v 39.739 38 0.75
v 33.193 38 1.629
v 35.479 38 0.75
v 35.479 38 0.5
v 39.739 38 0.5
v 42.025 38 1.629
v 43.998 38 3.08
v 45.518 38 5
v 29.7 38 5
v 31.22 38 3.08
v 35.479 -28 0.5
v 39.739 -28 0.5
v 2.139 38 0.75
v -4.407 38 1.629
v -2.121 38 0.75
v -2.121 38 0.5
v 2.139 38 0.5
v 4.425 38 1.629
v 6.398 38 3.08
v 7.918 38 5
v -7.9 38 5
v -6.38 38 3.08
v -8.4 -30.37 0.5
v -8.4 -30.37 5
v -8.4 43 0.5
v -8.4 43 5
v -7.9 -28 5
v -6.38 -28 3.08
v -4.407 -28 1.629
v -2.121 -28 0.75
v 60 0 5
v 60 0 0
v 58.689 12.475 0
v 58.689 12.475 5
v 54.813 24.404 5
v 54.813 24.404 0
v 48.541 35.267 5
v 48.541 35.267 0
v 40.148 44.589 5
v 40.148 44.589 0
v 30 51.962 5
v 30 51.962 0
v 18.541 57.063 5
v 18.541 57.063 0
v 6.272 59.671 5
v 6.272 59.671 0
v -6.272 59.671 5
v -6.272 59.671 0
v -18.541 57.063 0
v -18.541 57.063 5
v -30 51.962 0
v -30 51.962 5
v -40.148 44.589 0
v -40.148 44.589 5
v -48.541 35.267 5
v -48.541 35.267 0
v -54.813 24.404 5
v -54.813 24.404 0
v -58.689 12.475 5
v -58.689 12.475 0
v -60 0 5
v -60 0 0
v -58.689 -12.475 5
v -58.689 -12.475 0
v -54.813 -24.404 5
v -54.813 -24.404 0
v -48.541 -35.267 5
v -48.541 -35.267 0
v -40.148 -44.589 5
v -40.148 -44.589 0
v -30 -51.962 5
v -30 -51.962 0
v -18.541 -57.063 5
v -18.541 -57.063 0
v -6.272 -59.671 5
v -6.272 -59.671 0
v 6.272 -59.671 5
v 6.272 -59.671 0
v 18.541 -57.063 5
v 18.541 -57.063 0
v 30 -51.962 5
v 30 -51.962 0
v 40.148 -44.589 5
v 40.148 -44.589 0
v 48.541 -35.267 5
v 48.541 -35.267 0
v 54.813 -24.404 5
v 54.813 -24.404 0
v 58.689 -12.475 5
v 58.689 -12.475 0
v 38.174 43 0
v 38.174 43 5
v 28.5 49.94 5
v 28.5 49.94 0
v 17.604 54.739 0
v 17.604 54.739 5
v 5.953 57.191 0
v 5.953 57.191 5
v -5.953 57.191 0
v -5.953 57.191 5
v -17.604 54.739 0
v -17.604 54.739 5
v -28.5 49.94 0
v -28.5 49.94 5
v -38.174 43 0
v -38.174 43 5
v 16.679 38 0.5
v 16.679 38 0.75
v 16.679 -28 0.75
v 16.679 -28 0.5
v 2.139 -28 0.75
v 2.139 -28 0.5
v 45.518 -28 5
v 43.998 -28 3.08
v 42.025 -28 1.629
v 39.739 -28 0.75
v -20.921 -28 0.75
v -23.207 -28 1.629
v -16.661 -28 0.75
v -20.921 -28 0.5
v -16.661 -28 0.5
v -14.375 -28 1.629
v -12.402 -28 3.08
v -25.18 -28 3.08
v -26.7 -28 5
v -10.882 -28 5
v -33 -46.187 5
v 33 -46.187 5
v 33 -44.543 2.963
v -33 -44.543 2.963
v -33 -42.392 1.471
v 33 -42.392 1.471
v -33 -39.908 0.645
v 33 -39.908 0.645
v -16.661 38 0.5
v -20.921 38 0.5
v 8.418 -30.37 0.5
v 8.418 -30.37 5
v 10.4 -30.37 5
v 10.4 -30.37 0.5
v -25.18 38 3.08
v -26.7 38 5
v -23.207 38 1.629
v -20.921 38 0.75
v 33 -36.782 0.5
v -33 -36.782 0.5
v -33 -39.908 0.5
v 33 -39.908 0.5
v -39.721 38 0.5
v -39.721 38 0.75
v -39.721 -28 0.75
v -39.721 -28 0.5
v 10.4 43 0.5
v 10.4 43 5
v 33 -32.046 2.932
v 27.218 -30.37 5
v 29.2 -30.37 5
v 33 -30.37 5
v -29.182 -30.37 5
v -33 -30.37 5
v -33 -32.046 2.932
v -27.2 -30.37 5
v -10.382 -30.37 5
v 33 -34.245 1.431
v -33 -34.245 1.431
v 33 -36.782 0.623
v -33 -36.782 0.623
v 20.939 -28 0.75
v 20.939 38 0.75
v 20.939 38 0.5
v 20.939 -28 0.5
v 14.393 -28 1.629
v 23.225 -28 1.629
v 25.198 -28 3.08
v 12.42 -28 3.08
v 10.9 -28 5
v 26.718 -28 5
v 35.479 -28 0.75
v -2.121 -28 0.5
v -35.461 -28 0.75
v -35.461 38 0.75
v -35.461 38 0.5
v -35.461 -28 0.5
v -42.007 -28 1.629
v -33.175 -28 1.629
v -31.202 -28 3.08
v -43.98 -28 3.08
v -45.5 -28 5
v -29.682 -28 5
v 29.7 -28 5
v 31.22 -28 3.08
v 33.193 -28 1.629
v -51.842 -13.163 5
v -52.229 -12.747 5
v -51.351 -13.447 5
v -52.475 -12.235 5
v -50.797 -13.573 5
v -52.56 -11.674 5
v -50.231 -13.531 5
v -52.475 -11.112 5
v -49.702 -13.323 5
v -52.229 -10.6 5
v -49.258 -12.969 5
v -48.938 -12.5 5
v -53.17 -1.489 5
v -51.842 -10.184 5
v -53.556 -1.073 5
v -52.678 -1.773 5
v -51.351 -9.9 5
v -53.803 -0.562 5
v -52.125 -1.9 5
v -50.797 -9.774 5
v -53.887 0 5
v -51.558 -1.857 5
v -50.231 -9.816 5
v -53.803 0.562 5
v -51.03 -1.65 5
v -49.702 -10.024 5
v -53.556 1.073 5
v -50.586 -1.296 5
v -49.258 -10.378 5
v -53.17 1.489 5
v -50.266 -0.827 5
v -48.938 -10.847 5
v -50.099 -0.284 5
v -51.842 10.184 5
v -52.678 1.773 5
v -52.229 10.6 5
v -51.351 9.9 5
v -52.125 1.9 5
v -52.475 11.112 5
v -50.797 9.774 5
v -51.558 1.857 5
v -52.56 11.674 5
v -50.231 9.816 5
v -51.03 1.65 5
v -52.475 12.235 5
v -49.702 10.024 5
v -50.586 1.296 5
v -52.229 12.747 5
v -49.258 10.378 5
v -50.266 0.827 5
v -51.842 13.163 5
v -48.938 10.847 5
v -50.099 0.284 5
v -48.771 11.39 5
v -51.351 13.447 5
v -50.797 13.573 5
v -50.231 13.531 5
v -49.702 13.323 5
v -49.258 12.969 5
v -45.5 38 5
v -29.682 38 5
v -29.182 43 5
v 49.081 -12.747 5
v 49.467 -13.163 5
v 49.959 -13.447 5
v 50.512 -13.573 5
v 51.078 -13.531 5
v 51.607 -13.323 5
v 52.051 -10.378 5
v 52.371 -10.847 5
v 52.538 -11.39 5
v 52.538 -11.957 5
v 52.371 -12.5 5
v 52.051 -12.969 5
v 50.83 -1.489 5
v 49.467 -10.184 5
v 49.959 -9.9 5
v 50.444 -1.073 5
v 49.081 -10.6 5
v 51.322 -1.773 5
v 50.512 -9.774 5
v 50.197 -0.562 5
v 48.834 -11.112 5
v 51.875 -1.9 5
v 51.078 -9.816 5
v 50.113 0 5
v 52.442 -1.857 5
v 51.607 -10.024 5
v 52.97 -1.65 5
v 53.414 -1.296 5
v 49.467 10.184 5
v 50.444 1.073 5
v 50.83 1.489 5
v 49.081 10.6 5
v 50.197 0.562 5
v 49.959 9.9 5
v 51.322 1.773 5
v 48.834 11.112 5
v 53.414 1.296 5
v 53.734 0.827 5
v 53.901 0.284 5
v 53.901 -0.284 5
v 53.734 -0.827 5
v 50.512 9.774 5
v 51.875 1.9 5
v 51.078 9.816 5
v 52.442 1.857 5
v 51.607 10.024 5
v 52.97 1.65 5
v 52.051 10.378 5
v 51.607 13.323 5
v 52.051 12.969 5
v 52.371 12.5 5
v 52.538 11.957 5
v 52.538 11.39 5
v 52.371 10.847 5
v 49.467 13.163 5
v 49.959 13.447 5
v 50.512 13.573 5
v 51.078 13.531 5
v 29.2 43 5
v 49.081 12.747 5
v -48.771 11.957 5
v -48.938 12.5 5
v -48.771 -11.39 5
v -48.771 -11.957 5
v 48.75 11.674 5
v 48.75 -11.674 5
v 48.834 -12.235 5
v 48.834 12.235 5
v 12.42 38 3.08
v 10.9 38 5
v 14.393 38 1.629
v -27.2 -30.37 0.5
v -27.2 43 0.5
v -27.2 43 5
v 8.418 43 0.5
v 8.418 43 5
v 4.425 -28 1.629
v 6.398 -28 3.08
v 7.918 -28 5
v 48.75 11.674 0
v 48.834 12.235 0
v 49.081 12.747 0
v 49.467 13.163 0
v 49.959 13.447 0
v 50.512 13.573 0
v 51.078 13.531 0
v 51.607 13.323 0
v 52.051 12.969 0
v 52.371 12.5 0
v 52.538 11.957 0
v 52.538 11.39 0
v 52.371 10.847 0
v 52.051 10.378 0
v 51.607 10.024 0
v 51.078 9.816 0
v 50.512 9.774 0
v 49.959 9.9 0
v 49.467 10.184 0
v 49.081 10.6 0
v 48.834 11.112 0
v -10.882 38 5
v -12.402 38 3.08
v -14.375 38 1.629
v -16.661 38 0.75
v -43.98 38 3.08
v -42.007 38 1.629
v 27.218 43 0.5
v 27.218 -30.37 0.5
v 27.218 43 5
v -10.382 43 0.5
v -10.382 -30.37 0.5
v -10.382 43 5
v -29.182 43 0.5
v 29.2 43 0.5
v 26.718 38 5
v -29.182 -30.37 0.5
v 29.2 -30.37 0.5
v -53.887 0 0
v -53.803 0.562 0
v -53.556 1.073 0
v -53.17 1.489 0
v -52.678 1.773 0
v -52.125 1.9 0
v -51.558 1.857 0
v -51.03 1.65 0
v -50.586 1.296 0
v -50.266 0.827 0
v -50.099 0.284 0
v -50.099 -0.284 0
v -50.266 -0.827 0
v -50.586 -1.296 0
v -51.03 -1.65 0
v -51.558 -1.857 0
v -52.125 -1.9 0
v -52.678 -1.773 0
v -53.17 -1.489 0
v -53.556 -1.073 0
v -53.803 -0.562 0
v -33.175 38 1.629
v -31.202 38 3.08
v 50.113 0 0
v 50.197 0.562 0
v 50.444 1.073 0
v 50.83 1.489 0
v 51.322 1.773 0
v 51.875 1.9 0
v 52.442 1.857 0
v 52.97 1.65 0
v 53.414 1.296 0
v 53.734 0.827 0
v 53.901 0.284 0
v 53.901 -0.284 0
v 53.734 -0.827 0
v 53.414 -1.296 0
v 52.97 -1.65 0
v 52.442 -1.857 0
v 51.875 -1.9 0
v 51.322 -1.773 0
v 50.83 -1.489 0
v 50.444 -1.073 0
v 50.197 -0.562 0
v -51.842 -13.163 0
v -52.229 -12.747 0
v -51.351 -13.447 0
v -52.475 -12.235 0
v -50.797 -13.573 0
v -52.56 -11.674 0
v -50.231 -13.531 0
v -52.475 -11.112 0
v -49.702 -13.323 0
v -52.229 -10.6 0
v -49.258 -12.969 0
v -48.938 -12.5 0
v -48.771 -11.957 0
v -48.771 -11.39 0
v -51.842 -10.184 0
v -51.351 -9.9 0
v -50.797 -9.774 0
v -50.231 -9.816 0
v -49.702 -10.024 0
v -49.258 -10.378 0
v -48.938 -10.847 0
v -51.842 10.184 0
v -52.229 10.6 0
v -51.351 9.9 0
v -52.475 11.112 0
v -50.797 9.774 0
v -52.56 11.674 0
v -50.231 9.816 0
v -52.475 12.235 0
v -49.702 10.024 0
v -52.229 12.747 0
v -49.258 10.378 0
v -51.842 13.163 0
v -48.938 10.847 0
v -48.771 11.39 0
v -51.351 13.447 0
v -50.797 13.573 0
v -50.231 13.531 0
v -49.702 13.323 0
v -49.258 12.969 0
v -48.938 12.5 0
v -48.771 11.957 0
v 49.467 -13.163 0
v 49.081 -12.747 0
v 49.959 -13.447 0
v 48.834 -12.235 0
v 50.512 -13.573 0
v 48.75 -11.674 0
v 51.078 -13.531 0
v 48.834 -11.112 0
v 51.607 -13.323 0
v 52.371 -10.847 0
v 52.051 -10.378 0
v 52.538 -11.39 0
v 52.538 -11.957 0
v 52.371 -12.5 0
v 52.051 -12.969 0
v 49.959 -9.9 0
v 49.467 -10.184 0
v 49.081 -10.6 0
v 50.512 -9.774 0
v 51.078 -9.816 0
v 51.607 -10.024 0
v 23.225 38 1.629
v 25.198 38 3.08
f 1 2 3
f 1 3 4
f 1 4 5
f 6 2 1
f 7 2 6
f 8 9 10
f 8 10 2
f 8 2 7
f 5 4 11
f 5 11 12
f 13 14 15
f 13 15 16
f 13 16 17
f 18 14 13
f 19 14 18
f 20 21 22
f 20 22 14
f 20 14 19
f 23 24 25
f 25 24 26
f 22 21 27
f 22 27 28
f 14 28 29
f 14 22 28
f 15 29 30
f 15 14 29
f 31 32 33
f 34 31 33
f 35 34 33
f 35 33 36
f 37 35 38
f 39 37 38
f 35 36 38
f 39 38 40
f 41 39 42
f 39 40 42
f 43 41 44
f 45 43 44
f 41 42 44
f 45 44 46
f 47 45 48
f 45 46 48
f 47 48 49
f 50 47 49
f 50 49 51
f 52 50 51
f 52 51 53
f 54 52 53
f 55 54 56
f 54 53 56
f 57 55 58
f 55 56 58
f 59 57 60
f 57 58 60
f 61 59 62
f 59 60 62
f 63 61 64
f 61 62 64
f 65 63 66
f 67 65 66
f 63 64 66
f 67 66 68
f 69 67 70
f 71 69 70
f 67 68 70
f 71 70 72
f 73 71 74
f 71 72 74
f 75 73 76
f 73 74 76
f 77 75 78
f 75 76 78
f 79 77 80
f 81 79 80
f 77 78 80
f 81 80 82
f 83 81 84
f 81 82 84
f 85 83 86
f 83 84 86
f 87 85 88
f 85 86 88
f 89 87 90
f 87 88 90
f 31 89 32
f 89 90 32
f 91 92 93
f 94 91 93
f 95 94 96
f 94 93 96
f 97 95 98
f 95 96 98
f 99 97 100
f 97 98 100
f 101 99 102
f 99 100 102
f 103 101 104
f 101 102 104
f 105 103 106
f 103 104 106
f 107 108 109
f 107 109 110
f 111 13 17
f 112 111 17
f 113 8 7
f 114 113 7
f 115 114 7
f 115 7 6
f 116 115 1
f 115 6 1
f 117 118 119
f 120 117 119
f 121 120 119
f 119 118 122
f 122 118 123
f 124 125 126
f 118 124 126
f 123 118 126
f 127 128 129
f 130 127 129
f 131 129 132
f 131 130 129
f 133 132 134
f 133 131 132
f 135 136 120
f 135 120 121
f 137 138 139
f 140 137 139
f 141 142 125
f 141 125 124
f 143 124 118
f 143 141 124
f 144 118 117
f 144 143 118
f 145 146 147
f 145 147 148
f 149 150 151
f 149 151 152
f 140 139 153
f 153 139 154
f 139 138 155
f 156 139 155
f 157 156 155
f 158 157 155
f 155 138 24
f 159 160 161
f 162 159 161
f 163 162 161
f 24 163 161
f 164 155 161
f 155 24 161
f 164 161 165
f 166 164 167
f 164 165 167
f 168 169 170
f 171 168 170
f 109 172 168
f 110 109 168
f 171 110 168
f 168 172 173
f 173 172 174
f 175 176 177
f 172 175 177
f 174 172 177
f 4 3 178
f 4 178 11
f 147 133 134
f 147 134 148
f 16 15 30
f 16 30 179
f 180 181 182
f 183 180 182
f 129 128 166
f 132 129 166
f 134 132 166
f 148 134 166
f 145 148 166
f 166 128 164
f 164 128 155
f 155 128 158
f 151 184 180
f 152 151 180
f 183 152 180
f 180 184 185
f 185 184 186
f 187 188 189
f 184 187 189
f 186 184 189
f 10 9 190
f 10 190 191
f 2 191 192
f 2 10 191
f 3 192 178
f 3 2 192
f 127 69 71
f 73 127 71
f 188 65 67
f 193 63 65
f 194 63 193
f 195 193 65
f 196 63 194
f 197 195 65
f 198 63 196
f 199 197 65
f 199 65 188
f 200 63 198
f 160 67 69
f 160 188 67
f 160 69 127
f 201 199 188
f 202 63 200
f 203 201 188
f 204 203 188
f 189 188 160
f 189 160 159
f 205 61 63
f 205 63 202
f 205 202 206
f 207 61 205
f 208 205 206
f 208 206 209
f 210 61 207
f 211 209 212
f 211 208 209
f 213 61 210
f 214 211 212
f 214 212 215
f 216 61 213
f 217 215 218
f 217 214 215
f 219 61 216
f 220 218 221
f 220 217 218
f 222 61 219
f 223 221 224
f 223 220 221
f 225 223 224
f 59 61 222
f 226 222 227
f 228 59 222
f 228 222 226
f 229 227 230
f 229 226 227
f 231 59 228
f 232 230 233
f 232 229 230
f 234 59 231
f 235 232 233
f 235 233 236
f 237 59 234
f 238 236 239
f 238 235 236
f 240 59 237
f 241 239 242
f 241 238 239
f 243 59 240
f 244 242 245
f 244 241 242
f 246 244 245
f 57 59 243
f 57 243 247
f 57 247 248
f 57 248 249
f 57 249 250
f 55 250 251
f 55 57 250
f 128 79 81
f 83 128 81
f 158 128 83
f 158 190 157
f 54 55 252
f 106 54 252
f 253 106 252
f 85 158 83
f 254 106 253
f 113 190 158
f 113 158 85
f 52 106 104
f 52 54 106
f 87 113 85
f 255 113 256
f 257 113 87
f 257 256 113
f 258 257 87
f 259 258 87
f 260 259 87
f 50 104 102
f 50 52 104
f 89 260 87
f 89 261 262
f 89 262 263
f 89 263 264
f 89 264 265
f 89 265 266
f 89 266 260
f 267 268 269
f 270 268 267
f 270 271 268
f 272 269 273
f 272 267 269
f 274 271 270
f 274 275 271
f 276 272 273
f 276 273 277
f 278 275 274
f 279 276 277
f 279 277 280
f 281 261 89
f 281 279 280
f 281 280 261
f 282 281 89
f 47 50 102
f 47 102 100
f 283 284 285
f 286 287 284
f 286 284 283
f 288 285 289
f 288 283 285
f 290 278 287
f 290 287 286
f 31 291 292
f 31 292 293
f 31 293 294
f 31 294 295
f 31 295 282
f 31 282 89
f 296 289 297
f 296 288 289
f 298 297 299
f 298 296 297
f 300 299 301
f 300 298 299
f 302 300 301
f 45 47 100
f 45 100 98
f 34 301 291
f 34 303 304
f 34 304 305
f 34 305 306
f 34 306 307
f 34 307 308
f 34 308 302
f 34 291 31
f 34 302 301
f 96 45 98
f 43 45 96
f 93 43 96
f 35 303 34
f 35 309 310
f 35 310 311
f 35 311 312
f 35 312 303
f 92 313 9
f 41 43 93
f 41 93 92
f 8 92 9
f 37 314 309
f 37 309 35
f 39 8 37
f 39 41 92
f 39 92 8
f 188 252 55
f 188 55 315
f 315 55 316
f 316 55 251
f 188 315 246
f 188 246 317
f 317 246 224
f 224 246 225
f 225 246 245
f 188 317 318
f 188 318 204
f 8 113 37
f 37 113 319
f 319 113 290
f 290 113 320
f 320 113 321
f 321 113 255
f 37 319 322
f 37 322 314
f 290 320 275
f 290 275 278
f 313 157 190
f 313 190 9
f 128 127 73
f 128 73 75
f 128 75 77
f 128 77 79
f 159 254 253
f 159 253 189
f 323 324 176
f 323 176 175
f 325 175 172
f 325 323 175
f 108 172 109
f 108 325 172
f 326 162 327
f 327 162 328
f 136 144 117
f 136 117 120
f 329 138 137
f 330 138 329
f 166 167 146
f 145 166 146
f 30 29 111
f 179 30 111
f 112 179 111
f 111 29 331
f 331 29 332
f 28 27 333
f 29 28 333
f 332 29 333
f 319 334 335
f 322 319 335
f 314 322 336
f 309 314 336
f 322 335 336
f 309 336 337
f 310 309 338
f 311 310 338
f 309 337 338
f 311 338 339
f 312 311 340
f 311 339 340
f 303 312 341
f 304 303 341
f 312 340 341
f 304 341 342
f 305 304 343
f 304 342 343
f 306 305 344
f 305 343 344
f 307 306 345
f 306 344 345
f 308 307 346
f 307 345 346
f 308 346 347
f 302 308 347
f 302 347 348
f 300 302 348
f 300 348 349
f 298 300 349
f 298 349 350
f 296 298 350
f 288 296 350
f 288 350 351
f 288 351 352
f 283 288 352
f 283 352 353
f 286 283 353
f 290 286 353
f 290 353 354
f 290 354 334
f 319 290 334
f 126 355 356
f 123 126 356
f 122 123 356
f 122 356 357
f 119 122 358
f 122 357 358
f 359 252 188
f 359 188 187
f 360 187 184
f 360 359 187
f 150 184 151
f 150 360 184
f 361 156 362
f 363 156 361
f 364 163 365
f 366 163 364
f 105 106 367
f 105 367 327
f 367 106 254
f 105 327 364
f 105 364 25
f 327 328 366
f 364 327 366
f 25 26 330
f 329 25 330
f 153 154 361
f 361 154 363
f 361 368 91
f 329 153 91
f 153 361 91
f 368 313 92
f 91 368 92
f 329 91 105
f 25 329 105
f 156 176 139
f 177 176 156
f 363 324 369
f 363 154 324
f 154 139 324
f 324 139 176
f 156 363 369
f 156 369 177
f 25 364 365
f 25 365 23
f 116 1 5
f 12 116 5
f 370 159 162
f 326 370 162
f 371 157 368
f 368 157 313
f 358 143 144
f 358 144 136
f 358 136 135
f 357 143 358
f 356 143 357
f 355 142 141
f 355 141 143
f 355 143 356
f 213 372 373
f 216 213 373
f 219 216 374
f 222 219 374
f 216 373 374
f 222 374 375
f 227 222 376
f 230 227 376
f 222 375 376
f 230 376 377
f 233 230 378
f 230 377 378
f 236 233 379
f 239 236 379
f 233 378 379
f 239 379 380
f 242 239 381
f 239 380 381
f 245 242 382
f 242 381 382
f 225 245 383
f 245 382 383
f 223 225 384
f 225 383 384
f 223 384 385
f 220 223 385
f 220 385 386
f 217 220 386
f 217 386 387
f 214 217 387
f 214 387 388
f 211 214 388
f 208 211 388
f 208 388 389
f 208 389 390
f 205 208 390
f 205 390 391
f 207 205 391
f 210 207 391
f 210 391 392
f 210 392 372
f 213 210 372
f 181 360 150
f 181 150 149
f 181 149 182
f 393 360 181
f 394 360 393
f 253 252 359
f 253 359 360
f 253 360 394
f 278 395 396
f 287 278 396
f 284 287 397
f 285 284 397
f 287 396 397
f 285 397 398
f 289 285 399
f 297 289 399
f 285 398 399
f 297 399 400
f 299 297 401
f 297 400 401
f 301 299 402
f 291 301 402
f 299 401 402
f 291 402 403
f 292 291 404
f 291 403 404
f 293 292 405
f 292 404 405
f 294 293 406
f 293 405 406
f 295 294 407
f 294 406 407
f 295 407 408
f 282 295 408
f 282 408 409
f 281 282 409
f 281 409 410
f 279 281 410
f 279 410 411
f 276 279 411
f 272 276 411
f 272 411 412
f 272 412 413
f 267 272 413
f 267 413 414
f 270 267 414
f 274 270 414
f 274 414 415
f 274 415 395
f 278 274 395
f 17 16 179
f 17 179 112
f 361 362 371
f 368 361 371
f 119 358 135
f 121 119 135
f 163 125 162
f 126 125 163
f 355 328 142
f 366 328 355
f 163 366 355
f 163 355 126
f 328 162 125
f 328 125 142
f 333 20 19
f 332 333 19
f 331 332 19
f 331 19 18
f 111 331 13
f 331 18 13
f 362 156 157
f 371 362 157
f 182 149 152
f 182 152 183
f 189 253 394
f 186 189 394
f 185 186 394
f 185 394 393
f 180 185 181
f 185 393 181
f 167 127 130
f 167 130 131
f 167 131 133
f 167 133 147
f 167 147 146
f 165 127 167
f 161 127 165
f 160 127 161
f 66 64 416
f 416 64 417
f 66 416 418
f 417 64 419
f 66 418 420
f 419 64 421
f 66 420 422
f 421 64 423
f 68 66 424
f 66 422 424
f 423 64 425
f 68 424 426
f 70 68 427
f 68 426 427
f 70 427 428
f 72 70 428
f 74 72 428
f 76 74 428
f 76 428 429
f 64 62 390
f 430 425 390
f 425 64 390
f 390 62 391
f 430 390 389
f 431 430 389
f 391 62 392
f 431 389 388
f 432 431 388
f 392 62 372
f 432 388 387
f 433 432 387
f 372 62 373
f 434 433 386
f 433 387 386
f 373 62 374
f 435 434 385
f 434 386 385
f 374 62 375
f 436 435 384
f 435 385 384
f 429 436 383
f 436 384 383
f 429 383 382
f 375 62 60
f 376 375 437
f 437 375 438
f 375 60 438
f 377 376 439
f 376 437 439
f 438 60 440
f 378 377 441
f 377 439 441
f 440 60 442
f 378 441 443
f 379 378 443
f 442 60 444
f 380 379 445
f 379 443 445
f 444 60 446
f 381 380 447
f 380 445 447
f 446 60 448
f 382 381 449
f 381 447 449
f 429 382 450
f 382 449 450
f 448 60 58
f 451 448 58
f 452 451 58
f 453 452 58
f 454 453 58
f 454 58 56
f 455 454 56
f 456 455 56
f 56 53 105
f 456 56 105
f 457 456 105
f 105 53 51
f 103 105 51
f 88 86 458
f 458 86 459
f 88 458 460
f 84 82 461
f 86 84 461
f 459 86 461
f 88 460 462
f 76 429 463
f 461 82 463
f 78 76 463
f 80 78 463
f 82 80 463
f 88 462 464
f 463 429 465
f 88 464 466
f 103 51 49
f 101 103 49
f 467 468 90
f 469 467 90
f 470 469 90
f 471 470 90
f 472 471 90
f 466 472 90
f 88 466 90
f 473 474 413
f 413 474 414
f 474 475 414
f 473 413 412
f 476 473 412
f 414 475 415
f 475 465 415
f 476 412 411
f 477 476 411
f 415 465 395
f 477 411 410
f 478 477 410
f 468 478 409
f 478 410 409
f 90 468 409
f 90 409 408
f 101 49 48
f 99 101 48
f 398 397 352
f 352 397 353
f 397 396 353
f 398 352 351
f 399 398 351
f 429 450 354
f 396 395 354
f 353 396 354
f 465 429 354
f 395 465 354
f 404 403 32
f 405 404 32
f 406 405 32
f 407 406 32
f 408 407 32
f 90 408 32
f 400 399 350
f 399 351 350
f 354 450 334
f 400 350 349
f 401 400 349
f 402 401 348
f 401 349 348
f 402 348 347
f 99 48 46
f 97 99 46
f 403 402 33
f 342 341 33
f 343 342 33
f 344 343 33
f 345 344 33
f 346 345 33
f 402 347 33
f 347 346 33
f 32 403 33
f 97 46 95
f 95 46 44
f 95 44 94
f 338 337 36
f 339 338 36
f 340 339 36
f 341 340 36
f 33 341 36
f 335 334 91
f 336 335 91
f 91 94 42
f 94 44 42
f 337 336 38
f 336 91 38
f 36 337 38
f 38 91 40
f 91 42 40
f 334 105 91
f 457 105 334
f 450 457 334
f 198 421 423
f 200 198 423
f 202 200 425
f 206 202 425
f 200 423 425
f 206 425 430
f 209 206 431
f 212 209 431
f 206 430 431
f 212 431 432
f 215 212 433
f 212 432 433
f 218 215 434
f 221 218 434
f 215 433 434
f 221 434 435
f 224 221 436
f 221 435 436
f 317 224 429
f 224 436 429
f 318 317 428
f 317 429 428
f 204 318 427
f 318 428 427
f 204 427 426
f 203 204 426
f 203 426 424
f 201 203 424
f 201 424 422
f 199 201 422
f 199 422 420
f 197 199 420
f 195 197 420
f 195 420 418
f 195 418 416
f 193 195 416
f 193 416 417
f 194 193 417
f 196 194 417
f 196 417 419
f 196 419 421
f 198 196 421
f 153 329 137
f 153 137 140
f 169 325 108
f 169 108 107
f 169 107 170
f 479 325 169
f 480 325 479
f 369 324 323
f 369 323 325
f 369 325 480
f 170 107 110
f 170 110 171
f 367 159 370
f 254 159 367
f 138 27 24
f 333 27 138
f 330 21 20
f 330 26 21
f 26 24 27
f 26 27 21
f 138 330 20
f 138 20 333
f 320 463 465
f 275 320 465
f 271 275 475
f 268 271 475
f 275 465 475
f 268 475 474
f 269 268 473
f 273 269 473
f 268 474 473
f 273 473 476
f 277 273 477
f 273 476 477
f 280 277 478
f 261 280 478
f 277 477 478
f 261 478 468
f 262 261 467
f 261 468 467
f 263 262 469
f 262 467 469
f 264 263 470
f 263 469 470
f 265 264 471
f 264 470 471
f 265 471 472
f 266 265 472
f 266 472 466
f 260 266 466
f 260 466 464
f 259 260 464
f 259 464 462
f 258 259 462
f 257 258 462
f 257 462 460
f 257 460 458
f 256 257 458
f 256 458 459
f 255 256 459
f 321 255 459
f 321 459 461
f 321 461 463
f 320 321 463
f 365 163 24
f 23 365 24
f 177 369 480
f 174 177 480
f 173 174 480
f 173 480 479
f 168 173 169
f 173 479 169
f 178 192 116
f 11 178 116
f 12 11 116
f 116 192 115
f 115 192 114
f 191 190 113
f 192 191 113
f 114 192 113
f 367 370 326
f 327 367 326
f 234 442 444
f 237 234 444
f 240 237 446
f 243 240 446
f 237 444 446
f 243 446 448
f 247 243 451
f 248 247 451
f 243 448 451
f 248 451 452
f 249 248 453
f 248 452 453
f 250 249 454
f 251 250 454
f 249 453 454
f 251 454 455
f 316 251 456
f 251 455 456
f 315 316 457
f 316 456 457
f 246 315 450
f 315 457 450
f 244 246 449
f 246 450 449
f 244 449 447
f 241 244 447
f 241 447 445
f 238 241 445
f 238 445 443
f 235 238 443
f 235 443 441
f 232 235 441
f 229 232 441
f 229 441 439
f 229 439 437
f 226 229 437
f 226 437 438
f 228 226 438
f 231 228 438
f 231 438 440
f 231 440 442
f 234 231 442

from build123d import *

# Parameters (mm, degrees)
SKETCH1_R               = 60
BOSS_EXTRUDE1_DEPTH     = 5
SKETCH2_W               = 92
SKETCH2_H               = 66
CUT_EXTRUDE1_DEPTH      = 4.5
SKETCH3_W               = 66
SKETCH3_H               = 18.4
CUT_EXTRUDE2_DEPTH      = 4.5
CUT_EXTRUDE3_DEPTH      = 5.5
CUT_EXTRUDE3_DEPTH_BACK = 1.5
BOSS_EXTRUDE4_DEPTH     = 66
BOSS_EXTRUDE5_DEPTH     = 66
LPATTERN1_COUNT         = 5
LPATTERN1_PITCH         = 18.8
SKETCH10_R              = 1.905
CUT_EXTRUDE4_DEPTH      = 6
SKETCH11_W              = 1.982288408
SKETCH11_H              = 73.369538915
CUT_EXTRUDE5_DEPTH      = 4.5
LPATTERN2_COUNT         = 4
LPATTERN2_PITCH         = 18.8
SKETCH12_R              = 1.905
CUT_EXTRUDE6_DEPTH      = 6


with BuildPart() as part:
    # Sketch1 → Boss-Extrude1 (new body)
    with BuildSketch(Plane.XY):
        Circle(SKETCH1_R)
    extrude(amount=BOSS_EXTRUDE1_DEPTH)

    # Sketch2 → Cut-Extrude1 (cut)
    with BuildSketch(Plane.XY.offset(5)):
        with Locations((0, 5)):
            Rectangle(SKETCH2_W, SKETCH2_H)
    extrude(amount=-CUT_EXTRUDE1_DEPTH, mode=Mode.SUBTRACT)

    # Sketch3 → Cut-Extrude2 (cut)
    with BuildSketch(Plane.XY.offset(5)):
        with Locations((0, -38.2)):
            Rectangle(SKETCH3_W, SKETCH3_H)
    extrude(amount=-CUT_EXTRUDE2_DEPTH, mode=Mode.SUBTRACT)

    # Sketch4 → Cut-Extrude3 (cut, two sides)
    with BuildSketch(Plane.XY.offset(0.5)) as cut_extrude3_sk:
        with BuildLine():
            Line((-38.173943993, 43), (38.173943993, 43))
            ThreePointArc((38.173943993, 43), (0, 57.5), (-38.173943993, 43))
        make_face()
    extrude(amount=CUT_EXTRUDE3_DEPTH, mode=Mode.SUBTRACT)
    extrude(cut_extrude3_sk.sketch, amount=-CUT_EXTRUDE3_DEPTH_BACK, mode=Mode.SUBTRACT)

    # Sketch8 → Boss-Extrude4 (add)
    with BuildSketch(Plane(origin=(-33, 0, 0), x_dir=(0, 0, -1), z_dir=(1, 0, 0))):
        with BuildLine():
            Line((-5, -47.4), (-5, -46.187250507))
            ThreePointArc((-5, -46.187250507), (-2.139853595, -43.520930962), (-0.645401314, -39.907579367))
            Line((-0.645401314, -39.907579367), (-0.5, -39.907579367))
            Line((-0.5, -39.907579367), (-0.5, -47.4))
            Line((-0.5, -47.4), (-5, -47.4))
        make_face()
        with BuildLine():
            Line((-5, -29), (-5, -30.369538915))
            ThreePointArc((-5, -30.369538915), (-2.101750406, -33.091237194), (-0.622561202, -36.781696722))
            Line((-0.622561202, -36.781696722), (-0.5, -36.781696722))
            Line((-0.5, -36.781696722), (-0.5, -29))
            Line((-0.5, -29), (-5, -29))
        make_face()
    extrude(amount=BOSS_EXTRUDE4_DEPTH)

    # Sketch9 → Boss-Extrude5 (add)
    with BuildSketch(Plane(origin=(-30.969379717, 38, 37.672222409), x_dir=(0, 0, -1), z_dir=(0, -1, 0))):
        with BuildLine():
            Line((32.672222409, -15.030620283), (32.672222409, -14.530620283))
            ThreePointArc((32.672222409, -14.530620283), (35.383633316, -12.07254318), (36.922222409, -8.751905327))
            Line((36.922222409, -8.751905327), (37.172222409, -8.751905327))
            Line((37.172222409, -8.751905327), (37.172222409, -15.030620283))
            Line((37.172222409, -15.030620283), (32.672222409, -15.030620283))
        make_face()
        with BuildLine():
            Line((32.672222409, 1.787091309), (32.672222409, 1.287091309))
            ThreePointArc((32.672222409, 1.287091309), (35.383633316, -1.170985793), (36.922222409, -4.491623646))
            Line((36.922222409, -4.491623646), (37.172222409, -4.491623646))
            Line((37.172222409, -4.491623646), (37.172222409, 1.787091309))
            Line((37.172222409, 1.787091309), (32.672222409, 1.787091309))
        make_face()
    boss_extrude5 = extrude(amount=BOSS_EXTRUDE5_DEPTH)

    # LPattern1: Boss-Extrude5 ×5
    with Locations(*[(i * LPATTERN1_PITCH, 0, 0) for i in range(1, LPATTERN1_COUNT)]):
        add(boss_extrude5)

    # Sketch10 → Cut-Extrude4 (cut, through all)
    with BuildSketch(Plane(origin=(0, 0, 0), x_dir=(-1, 0, 0), z_dir=(0, 0, -1))):
        with Locations((-52.017711592, 0)):
            Circle(SKETCH10_R)
        with Locations((51.982288408, 0)):
            Circle(SKETCH10_R)
    extrude(amount=-CUT_EXTRUDE4_DEPTH, mode=Mode.SUBTRACT)

    # Sketch11 → Cut-Extrude5 (cut)
    with BuildSketch(Plane.XY.offset(5)):
        with Locations((-28.191144204, 6.315230542)):
            Rectangle(SKETCH11_W, SKETCH11_H)
    cut_extrude5 = extrude(amount=-CUT_EXTRUDE5_DEPTH, mode=Mode.SUBTRACT)

    # LPattern2: Cut-Extrude5 ×4
    with Locations(*[(i * LPATTERN2_PITCH, 0, 0) for i in range(1, LPATTERN2_COUNT)]):
        add(cut_extrude5, mode=Mode.SUBTRACT)

    # Sketch12 → Cut-Extrude6 (cut, through all)
    with BuildSketch(Plane(origin=(0, 0, 0), x_dir=(-1, 0, 0), z_dir=(0, 0, -1))):
        with Locations((-50.654578855, 11.67355769)):
            Circle(SKETCH12_R)
        with Locations((-50.654578855, -11.67355769)):
            Circle(SKETCH12_R)
        with Locations((50.654578855, -11.67355769)):
            Circle(SKETCH12_R)
        with Locations((50.654578855, 11.67355769)):
            Circle(SKETCH12_R)
    extrude(amount=-CUT_EXTRUDE6_DEPTH, mode=Mode.SUBTRACT)


solid = part.part
